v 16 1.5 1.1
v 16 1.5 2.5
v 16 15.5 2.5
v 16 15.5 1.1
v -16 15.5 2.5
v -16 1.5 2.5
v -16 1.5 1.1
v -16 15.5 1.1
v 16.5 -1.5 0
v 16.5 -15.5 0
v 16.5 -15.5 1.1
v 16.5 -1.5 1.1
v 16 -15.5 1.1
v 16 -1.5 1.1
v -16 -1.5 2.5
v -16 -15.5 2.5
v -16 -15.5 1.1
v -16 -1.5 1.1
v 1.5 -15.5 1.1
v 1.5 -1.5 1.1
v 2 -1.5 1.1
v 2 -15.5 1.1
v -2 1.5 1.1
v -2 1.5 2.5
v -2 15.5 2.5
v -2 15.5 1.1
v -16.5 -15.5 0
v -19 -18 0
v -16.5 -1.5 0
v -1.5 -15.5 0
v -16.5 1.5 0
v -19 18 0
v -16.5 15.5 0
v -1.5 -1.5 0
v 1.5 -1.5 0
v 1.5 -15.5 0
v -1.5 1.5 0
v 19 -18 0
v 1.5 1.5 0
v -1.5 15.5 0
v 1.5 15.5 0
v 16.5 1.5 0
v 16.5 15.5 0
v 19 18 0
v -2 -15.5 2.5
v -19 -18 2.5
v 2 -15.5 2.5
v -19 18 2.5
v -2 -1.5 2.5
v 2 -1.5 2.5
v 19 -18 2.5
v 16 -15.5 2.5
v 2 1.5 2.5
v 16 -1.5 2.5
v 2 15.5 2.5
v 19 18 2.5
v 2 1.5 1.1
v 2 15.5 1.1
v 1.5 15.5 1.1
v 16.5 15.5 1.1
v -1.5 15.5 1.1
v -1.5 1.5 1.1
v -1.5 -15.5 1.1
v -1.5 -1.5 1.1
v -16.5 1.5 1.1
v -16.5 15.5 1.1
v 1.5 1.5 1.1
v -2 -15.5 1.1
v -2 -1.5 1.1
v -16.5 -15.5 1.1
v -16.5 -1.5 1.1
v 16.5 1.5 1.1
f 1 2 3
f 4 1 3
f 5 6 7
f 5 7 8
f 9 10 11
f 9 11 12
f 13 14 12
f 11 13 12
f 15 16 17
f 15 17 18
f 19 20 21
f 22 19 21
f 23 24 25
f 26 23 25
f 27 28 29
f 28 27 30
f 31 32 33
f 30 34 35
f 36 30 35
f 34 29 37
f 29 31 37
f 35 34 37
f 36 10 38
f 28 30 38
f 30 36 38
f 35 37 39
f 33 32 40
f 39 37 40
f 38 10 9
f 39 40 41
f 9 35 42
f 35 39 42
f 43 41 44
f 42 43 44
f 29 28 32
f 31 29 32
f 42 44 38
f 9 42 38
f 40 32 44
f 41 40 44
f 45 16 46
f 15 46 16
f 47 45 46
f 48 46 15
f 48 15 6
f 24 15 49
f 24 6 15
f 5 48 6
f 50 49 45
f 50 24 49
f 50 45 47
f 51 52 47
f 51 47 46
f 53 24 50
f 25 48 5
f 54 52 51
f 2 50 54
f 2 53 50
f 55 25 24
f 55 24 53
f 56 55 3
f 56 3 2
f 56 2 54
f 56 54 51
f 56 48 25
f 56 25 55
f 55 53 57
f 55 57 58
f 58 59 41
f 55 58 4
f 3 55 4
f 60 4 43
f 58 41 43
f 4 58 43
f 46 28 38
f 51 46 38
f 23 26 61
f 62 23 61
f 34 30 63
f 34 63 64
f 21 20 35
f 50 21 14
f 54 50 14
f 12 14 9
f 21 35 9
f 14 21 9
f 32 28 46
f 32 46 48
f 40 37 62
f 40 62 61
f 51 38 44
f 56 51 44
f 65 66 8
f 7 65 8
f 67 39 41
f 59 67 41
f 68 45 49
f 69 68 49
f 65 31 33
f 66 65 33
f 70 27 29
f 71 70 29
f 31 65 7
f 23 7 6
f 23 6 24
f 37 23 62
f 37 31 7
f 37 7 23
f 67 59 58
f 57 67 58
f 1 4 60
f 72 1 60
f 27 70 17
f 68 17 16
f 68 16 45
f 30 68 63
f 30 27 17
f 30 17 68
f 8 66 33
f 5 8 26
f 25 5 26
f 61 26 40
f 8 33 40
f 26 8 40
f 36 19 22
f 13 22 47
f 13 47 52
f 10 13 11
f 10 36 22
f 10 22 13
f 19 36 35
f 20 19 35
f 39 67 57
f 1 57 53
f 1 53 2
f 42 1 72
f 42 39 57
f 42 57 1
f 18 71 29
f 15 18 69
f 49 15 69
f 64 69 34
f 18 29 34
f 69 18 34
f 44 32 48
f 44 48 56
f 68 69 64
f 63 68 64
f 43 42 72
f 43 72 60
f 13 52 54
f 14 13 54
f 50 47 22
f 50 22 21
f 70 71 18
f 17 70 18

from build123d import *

# Parameters (mm, degrees)
SKETCH_W        = 38
SKETCH_H        = 36
PAD_DEPTH       = 2.5
SKETCH001_W     = 14
SKETCH001_H     = 14
POCKET_DEPTH    = 1.4
SKETCH002_W     = 15
SKETCH002_H     = 14
POCKET001_DEPTH = 1.1


with BuildPart() as part:
    # Sketch → Pad (new body)
    with BuildSketch(Plane.XY):
        Rectangle(SKETCH_W, SKETCH_H)
    extrude(amount=PAD_DEPTH)

    # Sketch001 (on DatumPlane) → Pocket (cut)
    with BuildSketch(Plane.XY.offset(2.5)):
        with Locations((-9, 8.5)):
            Rectangle(SKETCH001_W, SKETCH001_H)
        with Locations((9, 8.5)):
            Rectangle(SKETCH001_W, SKETCH001_H)
        with Locations((9, -8.5)):
            Rectangle(SKETCH001_W, SKETCH001_H)
        with Locations((-9, -8.5)):
            Rectangle(SKETCH001_W, SKETCH001_H)
    extrude(amount=-POCKET_DEPTH, mode=Mode.SUBTRACT)

    # Sketch002 → Pocket001 (cut)
    with BuildSketch(Plane.XY):
        with Locations((9, -8.5)):
            Rectangle(SKETCH002_W, SKETCH002_H)
        with Locations((9, 8.5)):
            Rectangle(SKETCH002_W, SKETCH002_H)
        with Locations((-9, 8.5)):
            Rectangle(SKETCH002_W, SKETCH002_H)
        with Locations((-9, -8.5)):
            Rectangle(SKETCH002_W, SKETCH002_H)
    extrude(amount=POCKET001_DEPTH, mode=Mode.SUBTRACT)


solid = part.part
